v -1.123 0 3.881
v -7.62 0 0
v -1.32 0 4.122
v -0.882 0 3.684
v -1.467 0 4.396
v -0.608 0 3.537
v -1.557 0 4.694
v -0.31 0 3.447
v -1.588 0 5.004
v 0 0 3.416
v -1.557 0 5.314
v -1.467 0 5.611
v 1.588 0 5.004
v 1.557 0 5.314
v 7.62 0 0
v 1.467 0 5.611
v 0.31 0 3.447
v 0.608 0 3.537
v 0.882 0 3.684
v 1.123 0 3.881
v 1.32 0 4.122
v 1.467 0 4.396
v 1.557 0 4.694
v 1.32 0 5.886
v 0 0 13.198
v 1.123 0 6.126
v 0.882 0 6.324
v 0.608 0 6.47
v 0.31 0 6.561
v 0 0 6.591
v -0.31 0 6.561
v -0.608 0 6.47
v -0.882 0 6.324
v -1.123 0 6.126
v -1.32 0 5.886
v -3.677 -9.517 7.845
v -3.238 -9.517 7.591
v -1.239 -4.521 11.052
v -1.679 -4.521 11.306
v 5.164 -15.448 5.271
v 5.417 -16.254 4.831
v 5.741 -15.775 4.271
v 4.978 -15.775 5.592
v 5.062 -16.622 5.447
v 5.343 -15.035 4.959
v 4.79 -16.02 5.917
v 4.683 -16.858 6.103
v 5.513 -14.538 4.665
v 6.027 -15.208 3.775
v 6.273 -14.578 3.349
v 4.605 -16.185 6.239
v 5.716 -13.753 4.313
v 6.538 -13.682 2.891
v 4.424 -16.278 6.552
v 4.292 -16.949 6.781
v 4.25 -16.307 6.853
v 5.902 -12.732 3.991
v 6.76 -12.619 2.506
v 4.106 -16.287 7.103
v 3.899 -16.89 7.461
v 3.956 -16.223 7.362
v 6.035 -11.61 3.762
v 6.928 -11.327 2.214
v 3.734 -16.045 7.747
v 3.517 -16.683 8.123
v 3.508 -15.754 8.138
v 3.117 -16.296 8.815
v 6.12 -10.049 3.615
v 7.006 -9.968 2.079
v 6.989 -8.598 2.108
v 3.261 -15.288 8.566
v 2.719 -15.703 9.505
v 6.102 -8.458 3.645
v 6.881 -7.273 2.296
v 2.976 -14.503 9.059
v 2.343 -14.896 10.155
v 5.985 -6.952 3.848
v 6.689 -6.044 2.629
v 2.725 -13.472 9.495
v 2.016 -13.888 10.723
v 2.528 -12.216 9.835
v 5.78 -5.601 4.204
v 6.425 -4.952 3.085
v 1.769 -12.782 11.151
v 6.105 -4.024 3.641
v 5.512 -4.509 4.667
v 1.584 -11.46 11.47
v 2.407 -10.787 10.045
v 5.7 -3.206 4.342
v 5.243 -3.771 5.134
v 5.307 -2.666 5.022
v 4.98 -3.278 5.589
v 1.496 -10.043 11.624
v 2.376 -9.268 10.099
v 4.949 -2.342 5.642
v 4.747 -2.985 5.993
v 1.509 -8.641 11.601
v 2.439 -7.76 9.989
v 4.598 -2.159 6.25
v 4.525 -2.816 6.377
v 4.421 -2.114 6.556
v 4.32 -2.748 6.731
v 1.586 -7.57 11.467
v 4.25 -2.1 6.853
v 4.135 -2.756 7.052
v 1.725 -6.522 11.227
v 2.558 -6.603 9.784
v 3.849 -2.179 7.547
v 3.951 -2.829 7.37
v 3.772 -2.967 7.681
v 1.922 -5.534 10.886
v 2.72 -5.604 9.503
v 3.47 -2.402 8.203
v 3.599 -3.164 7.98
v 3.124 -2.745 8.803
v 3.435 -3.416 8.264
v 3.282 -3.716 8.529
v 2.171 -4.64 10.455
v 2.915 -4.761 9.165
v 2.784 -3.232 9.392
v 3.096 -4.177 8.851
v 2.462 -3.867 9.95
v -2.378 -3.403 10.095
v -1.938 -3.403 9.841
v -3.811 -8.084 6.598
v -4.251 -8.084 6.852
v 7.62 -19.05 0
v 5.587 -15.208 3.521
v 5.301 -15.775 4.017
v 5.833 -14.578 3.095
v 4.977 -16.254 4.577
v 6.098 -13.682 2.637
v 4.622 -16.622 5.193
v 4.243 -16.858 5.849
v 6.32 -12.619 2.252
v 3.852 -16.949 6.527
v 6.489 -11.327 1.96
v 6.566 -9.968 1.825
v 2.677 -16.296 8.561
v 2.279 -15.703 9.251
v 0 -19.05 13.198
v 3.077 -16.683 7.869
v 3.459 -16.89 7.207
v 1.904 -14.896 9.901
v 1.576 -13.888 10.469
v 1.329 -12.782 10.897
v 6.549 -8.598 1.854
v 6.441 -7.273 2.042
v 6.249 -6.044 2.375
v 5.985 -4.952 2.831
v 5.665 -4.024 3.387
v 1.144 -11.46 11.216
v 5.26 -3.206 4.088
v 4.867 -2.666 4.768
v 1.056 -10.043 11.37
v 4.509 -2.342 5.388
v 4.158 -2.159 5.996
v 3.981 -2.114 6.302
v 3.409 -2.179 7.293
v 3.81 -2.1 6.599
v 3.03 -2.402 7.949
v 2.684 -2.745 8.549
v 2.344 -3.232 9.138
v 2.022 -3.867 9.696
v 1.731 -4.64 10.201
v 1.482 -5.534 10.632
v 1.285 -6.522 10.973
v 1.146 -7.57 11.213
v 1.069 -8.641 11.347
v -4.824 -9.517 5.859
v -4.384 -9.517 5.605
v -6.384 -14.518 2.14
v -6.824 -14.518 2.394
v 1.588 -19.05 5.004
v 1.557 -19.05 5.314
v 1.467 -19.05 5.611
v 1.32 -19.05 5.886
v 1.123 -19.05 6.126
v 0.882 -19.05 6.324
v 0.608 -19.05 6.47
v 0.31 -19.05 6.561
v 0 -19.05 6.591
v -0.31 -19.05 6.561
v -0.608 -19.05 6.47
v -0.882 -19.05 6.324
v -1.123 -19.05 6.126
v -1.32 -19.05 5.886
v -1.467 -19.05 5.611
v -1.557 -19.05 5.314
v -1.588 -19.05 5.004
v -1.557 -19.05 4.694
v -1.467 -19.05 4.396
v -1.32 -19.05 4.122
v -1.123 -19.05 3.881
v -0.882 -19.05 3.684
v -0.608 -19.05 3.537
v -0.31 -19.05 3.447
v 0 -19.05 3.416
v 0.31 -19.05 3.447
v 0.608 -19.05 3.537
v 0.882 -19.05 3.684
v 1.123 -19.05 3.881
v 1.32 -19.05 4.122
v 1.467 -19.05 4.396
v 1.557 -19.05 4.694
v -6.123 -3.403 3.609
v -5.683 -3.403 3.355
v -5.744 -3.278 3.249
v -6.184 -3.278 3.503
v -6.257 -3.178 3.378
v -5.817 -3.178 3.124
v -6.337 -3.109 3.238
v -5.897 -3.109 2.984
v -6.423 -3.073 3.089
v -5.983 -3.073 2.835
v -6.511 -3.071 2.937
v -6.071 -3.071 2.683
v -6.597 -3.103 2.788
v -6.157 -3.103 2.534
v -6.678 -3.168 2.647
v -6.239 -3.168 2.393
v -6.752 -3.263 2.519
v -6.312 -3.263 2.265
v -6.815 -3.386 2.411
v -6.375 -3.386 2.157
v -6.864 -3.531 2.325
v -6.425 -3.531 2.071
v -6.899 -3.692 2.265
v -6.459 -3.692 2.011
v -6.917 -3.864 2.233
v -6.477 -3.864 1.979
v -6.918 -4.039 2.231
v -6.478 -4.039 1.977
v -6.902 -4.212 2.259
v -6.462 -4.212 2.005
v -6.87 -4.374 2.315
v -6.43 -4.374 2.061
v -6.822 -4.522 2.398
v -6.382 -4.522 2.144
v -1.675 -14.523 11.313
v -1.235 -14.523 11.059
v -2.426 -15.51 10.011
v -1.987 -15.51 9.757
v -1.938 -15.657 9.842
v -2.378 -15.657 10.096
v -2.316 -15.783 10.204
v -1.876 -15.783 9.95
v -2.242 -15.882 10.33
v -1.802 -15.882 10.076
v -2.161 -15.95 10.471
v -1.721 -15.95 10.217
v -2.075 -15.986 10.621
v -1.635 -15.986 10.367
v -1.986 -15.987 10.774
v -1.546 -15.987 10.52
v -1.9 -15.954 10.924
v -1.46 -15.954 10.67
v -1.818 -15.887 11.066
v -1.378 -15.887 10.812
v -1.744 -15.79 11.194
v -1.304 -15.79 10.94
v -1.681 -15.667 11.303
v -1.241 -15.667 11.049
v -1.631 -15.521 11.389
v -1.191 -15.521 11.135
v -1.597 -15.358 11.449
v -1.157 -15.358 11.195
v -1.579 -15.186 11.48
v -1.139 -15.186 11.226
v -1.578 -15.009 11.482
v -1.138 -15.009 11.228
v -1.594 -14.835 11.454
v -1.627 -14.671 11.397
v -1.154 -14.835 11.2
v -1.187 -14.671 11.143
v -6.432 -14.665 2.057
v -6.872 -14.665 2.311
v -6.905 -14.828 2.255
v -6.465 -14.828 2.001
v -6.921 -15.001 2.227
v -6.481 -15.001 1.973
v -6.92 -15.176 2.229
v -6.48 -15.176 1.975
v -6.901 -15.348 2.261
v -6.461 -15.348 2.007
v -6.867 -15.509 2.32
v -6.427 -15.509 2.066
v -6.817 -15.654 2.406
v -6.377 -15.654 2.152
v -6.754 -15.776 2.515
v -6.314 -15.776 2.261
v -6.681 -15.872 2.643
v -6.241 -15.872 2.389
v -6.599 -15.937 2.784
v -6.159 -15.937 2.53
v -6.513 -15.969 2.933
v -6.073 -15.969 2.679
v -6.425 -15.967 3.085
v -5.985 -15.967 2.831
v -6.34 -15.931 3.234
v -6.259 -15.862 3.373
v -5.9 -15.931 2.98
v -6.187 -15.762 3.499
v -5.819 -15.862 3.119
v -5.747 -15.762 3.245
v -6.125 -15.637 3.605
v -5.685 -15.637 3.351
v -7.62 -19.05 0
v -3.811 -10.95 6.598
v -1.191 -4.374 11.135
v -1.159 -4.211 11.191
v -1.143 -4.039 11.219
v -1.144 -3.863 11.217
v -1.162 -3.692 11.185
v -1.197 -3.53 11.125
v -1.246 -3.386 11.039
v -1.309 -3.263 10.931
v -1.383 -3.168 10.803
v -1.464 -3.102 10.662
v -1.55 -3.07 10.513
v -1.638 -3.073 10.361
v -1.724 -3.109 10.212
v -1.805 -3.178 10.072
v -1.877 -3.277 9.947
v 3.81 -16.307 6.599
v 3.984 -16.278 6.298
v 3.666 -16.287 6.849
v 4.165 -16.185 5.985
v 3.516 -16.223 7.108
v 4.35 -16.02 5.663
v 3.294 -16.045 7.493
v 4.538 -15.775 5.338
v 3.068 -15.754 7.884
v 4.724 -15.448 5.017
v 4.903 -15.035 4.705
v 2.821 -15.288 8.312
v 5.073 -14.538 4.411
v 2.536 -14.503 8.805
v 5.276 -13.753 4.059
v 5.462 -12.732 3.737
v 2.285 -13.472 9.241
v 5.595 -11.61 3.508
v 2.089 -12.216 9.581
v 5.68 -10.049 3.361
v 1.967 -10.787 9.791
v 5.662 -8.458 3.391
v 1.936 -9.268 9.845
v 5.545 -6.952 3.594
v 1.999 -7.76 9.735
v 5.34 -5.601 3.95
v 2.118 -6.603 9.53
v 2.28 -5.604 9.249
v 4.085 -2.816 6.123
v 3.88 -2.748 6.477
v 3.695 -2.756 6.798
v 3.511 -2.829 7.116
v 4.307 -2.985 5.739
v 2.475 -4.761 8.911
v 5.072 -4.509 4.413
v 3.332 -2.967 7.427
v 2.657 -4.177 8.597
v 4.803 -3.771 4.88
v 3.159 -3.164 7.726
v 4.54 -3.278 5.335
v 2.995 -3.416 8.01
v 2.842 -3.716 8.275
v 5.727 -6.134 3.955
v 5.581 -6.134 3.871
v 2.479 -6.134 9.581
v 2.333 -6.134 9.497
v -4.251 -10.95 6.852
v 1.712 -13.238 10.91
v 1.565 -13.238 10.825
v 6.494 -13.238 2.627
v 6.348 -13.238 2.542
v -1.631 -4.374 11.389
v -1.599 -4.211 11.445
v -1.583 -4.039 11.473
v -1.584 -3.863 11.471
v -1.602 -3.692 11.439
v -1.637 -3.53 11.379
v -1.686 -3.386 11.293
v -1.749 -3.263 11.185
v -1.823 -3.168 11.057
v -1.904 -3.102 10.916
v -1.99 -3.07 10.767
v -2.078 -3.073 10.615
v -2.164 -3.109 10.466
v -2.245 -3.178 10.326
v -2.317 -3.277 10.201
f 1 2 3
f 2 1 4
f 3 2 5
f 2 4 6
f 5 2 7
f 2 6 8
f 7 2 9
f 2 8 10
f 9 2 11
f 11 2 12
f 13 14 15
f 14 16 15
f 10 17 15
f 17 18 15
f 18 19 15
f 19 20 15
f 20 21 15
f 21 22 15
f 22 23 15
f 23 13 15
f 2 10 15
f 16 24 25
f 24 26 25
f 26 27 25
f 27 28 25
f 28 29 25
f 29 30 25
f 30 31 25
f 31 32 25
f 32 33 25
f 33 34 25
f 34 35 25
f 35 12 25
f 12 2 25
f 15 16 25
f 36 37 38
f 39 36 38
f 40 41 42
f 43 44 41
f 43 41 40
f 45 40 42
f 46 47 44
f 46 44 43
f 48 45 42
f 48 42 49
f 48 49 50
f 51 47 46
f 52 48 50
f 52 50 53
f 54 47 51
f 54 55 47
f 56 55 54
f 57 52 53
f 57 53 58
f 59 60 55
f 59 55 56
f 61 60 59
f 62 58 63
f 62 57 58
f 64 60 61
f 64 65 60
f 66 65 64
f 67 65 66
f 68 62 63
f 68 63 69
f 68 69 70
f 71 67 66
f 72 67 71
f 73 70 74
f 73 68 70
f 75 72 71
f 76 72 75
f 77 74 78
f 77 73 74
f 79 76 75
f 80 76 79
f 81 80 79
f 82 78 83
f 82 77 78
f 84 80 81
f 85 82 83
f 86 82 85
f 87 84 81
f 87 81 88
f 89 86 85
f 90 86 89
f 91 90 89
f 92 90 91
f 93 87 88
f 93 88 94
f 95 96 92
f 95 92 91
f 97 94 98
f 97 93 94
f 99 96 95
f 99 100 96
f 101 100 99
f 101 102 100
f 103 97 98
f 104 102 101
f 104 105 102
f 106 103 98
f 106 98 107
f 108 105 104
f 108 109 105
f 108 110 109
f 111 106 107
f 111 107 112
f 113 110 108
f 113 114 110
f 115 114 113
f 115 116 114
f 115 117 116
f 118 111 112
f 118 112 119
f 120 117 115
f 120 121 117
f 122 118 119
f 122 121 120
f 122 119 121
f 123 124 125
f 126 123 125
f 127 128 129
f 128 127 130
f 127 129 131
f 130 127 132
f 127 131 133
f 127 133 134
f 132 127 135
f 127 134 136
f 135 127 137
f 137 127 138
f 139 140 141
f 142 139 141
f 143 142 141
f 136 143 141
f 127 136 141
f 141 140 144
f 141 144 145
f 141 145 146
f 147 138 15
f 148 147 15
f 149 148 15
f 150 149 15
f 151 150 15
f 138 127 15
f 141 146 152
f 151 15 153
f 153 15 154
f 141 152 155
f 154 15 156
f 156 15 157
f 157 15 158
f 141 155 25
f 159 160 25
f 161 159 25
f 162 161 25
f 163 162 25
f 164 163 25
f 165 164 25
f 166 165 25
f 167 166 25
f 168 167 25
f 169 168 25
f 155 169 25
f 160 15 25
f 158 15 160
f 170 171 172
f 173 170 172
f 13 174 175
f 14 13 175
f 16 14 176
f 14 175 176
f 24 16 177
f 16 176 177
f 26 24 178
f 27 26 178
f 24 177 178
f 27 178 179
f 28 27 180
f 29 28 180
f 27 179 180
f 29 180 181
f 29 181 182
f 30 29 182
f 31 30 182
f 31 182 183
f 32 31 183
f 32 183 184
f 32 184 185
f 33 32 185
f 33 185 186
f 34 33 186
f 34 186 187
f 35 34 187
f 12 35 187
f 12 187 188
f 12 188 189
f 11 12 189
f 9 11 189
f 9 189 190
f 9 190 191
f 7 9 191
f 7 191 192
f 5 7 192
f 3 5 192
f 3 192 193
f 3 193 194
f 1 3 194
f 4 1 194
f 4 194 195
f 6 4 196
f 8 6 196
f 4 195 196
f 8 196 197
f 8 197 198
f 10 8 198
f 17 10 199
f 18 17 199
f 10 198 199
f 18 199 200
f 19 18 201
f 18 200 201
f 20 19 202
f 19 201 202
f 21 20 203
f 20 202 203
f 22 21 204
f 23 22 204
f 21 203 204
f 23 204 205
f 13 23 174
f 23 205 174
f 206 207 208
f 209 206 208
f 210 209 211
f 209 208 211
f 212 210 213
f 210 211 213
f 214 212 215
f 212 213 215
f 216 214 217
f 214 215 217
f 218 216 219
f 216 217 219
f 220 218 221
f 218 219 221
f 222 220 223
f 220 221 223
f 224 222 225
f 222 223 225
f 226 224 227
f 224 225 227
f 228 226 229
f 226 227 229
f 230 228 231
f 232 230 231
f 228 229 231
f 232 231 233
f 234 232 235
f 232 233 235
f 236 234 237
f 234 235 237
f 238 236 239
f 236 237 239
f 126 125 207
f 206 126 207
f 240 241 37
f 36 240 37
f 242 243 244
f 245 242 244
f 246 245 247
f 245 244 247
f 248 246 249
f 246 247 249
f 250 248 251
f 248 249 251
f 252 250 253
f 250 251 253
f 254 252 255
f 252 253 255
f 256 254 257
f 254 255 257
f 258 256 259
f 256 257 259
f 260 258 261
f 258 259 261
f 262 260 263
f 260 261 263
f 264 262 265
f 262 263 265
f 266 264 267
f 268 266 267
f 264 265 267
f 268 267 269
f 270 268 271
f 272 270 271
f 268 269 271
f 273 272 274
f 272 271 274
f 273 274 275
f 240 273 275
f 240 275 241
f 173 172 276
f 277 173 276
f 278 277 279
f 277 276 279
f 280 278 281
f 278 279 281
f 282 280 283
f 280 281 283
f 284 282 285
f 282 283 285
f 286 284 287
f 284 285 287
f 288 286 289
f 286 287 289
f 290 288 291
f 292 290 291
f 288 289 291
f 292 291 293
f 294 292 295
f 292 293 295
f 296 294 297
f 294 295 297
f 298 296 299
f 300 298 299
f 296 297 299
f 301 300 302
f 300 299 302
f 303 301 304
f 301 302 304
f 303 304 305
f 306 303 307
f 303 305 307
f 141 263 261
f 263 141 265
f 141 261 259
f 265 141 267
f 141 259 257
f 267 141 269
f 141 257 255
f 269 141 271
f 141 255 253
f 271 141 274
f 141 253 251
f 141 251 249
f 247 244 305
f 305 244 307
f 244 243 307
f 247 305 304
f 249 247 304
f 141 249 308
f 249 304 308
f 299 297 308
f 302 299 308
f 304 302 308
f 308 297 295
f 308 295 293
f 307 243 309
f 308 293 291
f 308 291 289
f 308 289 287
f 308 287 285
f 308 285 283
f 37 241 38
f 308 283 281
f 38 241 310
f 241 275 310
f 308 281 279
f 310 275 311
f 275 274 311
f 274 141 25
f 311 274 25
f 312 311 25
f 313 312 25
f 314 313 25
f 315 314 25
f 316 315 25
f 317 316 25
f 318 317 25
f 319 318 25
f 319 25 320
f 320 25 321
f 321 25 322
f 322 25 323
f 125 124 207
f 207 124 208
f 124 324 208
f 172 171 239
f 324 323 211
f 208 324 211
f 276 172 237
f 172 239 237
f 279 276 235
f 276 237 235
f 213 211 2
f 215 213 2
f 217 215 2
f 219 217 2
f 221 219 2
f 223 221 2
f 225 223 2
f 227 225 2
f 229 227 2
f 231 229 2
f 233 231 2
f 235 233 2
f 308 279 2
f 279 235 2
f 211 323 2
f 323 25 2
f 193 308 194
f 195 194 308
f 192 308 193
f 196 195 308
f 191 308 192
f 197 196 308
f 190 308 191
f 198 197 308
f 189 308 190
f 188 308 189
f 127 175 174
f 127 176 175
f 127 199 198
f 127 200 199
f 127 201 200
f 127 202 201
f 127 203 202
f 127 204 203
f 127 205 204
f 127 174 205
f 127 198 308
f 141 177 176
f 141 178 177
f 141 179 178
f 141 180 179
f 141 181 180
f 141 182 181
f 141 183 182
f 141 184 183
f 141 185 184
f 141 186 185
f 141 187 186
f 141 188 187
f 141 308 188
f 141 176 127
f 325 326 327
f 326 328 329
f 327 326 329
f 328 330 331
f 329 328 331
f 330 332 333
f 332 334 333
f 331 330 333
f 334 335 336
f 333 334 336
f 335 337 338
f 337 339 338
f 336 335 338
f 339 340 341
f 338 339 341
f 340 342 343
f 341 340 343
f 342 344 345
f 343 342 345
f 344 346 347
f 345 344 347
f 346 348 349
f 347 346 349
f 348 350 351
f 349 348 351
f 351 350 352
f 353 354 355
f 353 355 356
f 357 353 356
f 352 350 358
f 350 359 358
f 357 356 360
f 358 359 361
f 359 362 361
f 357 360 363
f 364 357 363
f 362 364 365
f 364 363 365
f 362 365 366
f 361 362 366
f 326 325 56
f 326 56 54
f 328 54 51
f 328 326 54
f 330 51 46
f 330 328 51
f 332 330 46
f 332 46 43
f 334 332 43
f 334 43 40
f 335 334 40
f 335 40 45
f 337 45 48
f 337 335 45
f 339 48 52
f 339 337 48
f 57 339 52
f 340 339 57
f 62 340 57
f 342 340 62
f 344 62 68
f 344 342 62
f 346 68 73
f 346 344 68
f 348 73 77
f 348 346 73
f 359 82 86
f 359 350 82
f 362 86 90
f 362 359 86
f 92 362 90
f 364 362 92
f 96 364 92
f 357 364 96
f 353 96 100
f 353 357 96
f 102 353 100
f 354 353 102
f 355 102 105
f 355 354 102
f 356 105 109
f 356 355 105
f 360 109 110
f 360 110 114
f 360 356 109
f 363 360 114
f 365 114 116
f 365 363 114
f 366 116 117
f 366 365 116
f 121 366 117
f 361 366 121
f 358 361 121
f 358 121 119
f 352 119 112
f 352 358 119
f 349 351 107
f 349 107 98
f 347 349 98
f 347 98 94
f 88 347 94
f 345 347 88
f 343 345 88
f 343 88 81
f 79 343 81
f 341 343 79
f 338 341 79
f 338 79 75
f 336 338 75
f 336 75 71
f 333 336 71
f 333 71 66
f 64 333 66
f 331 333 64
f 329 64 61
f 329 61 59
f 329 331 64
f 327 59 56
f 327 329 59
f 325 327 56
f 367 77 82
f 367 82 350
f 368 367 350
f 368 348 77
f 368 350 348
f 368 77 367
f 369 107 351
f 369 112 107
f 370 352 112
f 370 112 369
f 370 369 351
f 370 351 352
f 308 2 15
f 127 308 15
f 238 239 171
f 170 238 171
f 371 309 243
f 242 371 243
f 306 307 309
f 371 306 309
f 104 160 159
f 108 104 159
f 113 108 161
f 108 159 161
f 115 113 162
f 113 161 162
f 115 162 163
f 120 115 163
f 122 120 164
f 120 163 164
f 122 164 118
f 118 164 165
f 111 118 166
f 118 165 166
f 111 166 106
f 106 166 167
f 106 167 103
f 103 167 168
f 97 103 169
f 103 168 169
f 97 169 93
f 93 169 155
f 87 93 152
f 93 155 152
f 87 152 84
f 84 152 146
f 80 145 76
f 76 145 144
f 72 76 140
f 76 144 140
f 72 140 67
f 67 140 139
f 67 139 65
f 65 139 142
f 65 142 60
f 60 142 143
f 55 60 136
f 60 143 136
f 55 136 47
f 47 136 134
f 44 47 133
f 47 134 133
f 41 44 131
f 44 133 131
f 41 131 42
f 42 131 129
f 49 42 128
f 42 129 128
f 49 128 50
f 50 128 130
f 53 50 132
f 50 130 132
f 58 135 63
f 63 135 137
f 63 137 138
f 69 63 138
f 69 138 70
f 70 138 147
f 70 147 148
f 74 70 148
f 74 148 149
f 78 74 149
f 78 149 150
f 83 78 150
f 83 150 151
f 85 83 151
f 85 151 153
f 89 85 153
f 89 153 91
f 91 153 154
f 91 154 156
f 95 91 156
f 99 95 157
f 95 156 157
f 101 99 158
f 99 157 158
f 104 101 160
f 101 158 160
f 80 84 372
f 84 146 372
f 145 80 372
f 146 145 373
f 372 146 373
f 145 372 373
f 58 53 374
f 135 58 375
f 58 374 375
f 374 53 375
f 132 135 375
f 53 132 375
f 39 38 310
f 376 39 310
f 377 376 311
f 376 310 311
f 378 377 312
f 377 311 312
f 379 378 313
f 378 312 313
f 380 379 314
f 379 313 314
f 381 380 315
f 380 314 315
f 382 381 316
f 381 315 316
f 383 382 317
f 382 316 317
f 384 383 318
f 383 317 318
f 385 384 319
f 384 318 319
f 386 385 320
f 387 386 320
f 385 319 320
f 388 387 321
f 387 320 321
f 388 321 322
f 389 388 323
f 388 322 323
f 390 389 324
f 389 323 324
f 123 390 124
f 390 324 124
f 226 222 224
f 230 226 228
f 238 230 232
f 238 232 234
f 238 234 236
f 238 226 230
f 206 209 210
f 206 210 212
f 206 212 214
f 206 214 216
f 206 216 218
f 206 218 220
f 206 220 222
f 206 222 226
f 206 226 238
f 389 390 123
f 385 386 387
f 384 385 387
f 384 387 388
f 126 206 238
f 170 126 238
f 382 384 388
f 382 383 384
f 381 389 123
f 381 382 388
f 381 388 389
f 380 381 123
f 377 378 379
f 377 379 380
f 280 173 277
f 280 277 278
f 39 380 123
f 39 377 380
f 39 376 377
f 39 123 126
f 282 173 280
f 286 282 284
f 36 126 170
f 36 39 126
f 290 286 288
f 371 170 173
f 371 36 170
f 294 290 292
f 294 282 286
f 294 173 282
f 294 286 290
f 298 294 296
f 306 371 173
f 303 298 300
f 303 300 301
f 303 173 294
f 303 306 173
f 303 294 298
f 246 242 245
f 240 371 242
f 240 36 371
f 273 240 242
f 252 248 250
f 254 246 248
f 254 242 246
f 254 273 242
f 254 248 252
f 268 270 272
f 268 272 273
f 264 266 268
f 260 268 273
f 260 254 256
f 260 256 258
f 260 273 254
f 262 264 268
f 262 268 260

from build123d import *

# Parameters (mm, degrees)
F1_DEPTH = 19.05
F4_DEPTH = 0.508
F6_DEPTH = 0.508
F7_R     = 1.5875
F8_DEPTH = 25.4


with BuildPart() as f1:
    # F0 (on Front) → F1 (new body)
    with BuildSketch(Plane.XZ):
        Polygon((0, 13.1982271537), (-7.62, 0), (7.62, 0), align=None)
    extrude(amount=F1_DEPTH)

    # F2 (on face) → F4 (join)
    with BuildSketch(Plane(origin=(5.715, 0, 3.2995567884), x_dir=(0, 1, 0), z_dir=(0.8660254038, 0, 0.5))):
        with BuildLine():
            add(Edge.make_bspline(
                [(-2.0999179687, 3.81), (-2.0999179687, 13.3745915526), (-13.2375410156, 8.5922957763), (-24.3751640625, 3.81), (-13.2375410156, -0.9722957763), (-2.0999179687, -5.7545915526), (-2.0999179687, 3.81)],
                knots=[0, 0, 0, 2.0943951024, 2.0943951024, 4.1887902048, 4.1887902048, 6.2831853072, 6.2831853072, 6.2831853072], degree=2, weights=[1, 0.5, 1, 0.5, 1, 0.5, 1]))
        make_face()
        with BuildLine():
            add(Edge.make_bspline(
                [(-16.3071341813, 3.81), (-16.3071341813, -2.6864151896), (-6.1339329094, 0.5617924052), (4.0392683625, 3.81), (-6.1339329094, 7.0582075948), (-16.3071341813, 10.3064151896), (-16.3071341813, 3.81)],
                knots=[0, 0, 0, 2.0943951024, 2.0943951024, 4.1887902048, 4.1887902048, 6.2831853072, 6.2831853072, 6.2831853072], degree=2, weights=[1, 0.5, 1, 0.5, 1, 0.5, 1]))
        make_face(mode=Mode.SUBTRACT)
    extrude(amount=F4_DEPTH)

    # F5 (on face) → F6 (join)
    with BuildSketch(Plane(origin=(-5.715, 0, 3.2995567884), x_dir=(0, -1, 0), z_dir=(-0.8660254038, 0, 0.5))):
        with BuildLine():
            Line((9.5169473699, 2.6623777802), (8.0841222252, 3.8086378959))
            Line((8.0841222252, 3.8086378959), (3.403248724, 0.063939095))
            ThreePointArc((3.403248724, 0.063939095), (3.263460905, -1.194151276), (4.521551276, -1.333939095))
            Line((4.521551276, -1.333939095), (9.5169473699, 2.6623777802))
        make_face()
        with BuildLine():
            Line((15.6366038973, 0.0591923716), (10.9497847532, 3.8086476868))
            Line((10.9497847532, 3.8086476868), (9.5169473699, 2.6623777802))
            Line((9.5169473699, 2.6623777802), (14.5182917932, -1.3386977585))
            ThreePointArc((14.5182917932, -1.3386977585), (15.7763929103, -1.1989087455), (15.6366038973, 0.0591923716))
        make_face()
        with BuildLine():
            Line((14.5234926265, 8.9601342169), (9.5169596085, 4.9549078026))
            Line((9.5169596085, 4.9549078026), (10.9497847532, 3.8086476868))
            Line((10.9497847532, 3.8086476868), (15.5101895109, 7.456971493))
            ThreePointArc((15.5101895109, 7.456971493), (15.8425048748, 8.7505300422), (14.5234926265, 8.9601342169))
        make_face()
        with BuildLine():
            Line((9.5169596085, 4.9549078026), (4.5213740072, 8.9513762837))
            ThreePointArc((4.5213740072, 8.9513762837), (3.2632728901, 8.8115872707), (3.4030619031, 7.5534861536))
            Line((3.4030619031, 7.5534861536), (8.0841222252, 3.8086378959))
            Line((8.0841222252, 3.8086378959), (9.5169596085, 4.9549078026))
        make_face()
        Polygon((10.9497847532, 3.8086476868), (9.5169596085, 4.9549078026), (8.0841222252, 3.8086378959), (9.5169473699, 2.6623777802), align=None)
    extrude(amount=F6_DEPTH)

    # F7 (on face) → F8 (cut)
    with BuildSketch(Plane.XZ.offset(19.05)):
        with Locations((0, 5.0038)):
            Circle(F7_R)
    extrude(amount=-F8_DEPTH, mode=Mode.SUBTRACT)


solid = f1.part
